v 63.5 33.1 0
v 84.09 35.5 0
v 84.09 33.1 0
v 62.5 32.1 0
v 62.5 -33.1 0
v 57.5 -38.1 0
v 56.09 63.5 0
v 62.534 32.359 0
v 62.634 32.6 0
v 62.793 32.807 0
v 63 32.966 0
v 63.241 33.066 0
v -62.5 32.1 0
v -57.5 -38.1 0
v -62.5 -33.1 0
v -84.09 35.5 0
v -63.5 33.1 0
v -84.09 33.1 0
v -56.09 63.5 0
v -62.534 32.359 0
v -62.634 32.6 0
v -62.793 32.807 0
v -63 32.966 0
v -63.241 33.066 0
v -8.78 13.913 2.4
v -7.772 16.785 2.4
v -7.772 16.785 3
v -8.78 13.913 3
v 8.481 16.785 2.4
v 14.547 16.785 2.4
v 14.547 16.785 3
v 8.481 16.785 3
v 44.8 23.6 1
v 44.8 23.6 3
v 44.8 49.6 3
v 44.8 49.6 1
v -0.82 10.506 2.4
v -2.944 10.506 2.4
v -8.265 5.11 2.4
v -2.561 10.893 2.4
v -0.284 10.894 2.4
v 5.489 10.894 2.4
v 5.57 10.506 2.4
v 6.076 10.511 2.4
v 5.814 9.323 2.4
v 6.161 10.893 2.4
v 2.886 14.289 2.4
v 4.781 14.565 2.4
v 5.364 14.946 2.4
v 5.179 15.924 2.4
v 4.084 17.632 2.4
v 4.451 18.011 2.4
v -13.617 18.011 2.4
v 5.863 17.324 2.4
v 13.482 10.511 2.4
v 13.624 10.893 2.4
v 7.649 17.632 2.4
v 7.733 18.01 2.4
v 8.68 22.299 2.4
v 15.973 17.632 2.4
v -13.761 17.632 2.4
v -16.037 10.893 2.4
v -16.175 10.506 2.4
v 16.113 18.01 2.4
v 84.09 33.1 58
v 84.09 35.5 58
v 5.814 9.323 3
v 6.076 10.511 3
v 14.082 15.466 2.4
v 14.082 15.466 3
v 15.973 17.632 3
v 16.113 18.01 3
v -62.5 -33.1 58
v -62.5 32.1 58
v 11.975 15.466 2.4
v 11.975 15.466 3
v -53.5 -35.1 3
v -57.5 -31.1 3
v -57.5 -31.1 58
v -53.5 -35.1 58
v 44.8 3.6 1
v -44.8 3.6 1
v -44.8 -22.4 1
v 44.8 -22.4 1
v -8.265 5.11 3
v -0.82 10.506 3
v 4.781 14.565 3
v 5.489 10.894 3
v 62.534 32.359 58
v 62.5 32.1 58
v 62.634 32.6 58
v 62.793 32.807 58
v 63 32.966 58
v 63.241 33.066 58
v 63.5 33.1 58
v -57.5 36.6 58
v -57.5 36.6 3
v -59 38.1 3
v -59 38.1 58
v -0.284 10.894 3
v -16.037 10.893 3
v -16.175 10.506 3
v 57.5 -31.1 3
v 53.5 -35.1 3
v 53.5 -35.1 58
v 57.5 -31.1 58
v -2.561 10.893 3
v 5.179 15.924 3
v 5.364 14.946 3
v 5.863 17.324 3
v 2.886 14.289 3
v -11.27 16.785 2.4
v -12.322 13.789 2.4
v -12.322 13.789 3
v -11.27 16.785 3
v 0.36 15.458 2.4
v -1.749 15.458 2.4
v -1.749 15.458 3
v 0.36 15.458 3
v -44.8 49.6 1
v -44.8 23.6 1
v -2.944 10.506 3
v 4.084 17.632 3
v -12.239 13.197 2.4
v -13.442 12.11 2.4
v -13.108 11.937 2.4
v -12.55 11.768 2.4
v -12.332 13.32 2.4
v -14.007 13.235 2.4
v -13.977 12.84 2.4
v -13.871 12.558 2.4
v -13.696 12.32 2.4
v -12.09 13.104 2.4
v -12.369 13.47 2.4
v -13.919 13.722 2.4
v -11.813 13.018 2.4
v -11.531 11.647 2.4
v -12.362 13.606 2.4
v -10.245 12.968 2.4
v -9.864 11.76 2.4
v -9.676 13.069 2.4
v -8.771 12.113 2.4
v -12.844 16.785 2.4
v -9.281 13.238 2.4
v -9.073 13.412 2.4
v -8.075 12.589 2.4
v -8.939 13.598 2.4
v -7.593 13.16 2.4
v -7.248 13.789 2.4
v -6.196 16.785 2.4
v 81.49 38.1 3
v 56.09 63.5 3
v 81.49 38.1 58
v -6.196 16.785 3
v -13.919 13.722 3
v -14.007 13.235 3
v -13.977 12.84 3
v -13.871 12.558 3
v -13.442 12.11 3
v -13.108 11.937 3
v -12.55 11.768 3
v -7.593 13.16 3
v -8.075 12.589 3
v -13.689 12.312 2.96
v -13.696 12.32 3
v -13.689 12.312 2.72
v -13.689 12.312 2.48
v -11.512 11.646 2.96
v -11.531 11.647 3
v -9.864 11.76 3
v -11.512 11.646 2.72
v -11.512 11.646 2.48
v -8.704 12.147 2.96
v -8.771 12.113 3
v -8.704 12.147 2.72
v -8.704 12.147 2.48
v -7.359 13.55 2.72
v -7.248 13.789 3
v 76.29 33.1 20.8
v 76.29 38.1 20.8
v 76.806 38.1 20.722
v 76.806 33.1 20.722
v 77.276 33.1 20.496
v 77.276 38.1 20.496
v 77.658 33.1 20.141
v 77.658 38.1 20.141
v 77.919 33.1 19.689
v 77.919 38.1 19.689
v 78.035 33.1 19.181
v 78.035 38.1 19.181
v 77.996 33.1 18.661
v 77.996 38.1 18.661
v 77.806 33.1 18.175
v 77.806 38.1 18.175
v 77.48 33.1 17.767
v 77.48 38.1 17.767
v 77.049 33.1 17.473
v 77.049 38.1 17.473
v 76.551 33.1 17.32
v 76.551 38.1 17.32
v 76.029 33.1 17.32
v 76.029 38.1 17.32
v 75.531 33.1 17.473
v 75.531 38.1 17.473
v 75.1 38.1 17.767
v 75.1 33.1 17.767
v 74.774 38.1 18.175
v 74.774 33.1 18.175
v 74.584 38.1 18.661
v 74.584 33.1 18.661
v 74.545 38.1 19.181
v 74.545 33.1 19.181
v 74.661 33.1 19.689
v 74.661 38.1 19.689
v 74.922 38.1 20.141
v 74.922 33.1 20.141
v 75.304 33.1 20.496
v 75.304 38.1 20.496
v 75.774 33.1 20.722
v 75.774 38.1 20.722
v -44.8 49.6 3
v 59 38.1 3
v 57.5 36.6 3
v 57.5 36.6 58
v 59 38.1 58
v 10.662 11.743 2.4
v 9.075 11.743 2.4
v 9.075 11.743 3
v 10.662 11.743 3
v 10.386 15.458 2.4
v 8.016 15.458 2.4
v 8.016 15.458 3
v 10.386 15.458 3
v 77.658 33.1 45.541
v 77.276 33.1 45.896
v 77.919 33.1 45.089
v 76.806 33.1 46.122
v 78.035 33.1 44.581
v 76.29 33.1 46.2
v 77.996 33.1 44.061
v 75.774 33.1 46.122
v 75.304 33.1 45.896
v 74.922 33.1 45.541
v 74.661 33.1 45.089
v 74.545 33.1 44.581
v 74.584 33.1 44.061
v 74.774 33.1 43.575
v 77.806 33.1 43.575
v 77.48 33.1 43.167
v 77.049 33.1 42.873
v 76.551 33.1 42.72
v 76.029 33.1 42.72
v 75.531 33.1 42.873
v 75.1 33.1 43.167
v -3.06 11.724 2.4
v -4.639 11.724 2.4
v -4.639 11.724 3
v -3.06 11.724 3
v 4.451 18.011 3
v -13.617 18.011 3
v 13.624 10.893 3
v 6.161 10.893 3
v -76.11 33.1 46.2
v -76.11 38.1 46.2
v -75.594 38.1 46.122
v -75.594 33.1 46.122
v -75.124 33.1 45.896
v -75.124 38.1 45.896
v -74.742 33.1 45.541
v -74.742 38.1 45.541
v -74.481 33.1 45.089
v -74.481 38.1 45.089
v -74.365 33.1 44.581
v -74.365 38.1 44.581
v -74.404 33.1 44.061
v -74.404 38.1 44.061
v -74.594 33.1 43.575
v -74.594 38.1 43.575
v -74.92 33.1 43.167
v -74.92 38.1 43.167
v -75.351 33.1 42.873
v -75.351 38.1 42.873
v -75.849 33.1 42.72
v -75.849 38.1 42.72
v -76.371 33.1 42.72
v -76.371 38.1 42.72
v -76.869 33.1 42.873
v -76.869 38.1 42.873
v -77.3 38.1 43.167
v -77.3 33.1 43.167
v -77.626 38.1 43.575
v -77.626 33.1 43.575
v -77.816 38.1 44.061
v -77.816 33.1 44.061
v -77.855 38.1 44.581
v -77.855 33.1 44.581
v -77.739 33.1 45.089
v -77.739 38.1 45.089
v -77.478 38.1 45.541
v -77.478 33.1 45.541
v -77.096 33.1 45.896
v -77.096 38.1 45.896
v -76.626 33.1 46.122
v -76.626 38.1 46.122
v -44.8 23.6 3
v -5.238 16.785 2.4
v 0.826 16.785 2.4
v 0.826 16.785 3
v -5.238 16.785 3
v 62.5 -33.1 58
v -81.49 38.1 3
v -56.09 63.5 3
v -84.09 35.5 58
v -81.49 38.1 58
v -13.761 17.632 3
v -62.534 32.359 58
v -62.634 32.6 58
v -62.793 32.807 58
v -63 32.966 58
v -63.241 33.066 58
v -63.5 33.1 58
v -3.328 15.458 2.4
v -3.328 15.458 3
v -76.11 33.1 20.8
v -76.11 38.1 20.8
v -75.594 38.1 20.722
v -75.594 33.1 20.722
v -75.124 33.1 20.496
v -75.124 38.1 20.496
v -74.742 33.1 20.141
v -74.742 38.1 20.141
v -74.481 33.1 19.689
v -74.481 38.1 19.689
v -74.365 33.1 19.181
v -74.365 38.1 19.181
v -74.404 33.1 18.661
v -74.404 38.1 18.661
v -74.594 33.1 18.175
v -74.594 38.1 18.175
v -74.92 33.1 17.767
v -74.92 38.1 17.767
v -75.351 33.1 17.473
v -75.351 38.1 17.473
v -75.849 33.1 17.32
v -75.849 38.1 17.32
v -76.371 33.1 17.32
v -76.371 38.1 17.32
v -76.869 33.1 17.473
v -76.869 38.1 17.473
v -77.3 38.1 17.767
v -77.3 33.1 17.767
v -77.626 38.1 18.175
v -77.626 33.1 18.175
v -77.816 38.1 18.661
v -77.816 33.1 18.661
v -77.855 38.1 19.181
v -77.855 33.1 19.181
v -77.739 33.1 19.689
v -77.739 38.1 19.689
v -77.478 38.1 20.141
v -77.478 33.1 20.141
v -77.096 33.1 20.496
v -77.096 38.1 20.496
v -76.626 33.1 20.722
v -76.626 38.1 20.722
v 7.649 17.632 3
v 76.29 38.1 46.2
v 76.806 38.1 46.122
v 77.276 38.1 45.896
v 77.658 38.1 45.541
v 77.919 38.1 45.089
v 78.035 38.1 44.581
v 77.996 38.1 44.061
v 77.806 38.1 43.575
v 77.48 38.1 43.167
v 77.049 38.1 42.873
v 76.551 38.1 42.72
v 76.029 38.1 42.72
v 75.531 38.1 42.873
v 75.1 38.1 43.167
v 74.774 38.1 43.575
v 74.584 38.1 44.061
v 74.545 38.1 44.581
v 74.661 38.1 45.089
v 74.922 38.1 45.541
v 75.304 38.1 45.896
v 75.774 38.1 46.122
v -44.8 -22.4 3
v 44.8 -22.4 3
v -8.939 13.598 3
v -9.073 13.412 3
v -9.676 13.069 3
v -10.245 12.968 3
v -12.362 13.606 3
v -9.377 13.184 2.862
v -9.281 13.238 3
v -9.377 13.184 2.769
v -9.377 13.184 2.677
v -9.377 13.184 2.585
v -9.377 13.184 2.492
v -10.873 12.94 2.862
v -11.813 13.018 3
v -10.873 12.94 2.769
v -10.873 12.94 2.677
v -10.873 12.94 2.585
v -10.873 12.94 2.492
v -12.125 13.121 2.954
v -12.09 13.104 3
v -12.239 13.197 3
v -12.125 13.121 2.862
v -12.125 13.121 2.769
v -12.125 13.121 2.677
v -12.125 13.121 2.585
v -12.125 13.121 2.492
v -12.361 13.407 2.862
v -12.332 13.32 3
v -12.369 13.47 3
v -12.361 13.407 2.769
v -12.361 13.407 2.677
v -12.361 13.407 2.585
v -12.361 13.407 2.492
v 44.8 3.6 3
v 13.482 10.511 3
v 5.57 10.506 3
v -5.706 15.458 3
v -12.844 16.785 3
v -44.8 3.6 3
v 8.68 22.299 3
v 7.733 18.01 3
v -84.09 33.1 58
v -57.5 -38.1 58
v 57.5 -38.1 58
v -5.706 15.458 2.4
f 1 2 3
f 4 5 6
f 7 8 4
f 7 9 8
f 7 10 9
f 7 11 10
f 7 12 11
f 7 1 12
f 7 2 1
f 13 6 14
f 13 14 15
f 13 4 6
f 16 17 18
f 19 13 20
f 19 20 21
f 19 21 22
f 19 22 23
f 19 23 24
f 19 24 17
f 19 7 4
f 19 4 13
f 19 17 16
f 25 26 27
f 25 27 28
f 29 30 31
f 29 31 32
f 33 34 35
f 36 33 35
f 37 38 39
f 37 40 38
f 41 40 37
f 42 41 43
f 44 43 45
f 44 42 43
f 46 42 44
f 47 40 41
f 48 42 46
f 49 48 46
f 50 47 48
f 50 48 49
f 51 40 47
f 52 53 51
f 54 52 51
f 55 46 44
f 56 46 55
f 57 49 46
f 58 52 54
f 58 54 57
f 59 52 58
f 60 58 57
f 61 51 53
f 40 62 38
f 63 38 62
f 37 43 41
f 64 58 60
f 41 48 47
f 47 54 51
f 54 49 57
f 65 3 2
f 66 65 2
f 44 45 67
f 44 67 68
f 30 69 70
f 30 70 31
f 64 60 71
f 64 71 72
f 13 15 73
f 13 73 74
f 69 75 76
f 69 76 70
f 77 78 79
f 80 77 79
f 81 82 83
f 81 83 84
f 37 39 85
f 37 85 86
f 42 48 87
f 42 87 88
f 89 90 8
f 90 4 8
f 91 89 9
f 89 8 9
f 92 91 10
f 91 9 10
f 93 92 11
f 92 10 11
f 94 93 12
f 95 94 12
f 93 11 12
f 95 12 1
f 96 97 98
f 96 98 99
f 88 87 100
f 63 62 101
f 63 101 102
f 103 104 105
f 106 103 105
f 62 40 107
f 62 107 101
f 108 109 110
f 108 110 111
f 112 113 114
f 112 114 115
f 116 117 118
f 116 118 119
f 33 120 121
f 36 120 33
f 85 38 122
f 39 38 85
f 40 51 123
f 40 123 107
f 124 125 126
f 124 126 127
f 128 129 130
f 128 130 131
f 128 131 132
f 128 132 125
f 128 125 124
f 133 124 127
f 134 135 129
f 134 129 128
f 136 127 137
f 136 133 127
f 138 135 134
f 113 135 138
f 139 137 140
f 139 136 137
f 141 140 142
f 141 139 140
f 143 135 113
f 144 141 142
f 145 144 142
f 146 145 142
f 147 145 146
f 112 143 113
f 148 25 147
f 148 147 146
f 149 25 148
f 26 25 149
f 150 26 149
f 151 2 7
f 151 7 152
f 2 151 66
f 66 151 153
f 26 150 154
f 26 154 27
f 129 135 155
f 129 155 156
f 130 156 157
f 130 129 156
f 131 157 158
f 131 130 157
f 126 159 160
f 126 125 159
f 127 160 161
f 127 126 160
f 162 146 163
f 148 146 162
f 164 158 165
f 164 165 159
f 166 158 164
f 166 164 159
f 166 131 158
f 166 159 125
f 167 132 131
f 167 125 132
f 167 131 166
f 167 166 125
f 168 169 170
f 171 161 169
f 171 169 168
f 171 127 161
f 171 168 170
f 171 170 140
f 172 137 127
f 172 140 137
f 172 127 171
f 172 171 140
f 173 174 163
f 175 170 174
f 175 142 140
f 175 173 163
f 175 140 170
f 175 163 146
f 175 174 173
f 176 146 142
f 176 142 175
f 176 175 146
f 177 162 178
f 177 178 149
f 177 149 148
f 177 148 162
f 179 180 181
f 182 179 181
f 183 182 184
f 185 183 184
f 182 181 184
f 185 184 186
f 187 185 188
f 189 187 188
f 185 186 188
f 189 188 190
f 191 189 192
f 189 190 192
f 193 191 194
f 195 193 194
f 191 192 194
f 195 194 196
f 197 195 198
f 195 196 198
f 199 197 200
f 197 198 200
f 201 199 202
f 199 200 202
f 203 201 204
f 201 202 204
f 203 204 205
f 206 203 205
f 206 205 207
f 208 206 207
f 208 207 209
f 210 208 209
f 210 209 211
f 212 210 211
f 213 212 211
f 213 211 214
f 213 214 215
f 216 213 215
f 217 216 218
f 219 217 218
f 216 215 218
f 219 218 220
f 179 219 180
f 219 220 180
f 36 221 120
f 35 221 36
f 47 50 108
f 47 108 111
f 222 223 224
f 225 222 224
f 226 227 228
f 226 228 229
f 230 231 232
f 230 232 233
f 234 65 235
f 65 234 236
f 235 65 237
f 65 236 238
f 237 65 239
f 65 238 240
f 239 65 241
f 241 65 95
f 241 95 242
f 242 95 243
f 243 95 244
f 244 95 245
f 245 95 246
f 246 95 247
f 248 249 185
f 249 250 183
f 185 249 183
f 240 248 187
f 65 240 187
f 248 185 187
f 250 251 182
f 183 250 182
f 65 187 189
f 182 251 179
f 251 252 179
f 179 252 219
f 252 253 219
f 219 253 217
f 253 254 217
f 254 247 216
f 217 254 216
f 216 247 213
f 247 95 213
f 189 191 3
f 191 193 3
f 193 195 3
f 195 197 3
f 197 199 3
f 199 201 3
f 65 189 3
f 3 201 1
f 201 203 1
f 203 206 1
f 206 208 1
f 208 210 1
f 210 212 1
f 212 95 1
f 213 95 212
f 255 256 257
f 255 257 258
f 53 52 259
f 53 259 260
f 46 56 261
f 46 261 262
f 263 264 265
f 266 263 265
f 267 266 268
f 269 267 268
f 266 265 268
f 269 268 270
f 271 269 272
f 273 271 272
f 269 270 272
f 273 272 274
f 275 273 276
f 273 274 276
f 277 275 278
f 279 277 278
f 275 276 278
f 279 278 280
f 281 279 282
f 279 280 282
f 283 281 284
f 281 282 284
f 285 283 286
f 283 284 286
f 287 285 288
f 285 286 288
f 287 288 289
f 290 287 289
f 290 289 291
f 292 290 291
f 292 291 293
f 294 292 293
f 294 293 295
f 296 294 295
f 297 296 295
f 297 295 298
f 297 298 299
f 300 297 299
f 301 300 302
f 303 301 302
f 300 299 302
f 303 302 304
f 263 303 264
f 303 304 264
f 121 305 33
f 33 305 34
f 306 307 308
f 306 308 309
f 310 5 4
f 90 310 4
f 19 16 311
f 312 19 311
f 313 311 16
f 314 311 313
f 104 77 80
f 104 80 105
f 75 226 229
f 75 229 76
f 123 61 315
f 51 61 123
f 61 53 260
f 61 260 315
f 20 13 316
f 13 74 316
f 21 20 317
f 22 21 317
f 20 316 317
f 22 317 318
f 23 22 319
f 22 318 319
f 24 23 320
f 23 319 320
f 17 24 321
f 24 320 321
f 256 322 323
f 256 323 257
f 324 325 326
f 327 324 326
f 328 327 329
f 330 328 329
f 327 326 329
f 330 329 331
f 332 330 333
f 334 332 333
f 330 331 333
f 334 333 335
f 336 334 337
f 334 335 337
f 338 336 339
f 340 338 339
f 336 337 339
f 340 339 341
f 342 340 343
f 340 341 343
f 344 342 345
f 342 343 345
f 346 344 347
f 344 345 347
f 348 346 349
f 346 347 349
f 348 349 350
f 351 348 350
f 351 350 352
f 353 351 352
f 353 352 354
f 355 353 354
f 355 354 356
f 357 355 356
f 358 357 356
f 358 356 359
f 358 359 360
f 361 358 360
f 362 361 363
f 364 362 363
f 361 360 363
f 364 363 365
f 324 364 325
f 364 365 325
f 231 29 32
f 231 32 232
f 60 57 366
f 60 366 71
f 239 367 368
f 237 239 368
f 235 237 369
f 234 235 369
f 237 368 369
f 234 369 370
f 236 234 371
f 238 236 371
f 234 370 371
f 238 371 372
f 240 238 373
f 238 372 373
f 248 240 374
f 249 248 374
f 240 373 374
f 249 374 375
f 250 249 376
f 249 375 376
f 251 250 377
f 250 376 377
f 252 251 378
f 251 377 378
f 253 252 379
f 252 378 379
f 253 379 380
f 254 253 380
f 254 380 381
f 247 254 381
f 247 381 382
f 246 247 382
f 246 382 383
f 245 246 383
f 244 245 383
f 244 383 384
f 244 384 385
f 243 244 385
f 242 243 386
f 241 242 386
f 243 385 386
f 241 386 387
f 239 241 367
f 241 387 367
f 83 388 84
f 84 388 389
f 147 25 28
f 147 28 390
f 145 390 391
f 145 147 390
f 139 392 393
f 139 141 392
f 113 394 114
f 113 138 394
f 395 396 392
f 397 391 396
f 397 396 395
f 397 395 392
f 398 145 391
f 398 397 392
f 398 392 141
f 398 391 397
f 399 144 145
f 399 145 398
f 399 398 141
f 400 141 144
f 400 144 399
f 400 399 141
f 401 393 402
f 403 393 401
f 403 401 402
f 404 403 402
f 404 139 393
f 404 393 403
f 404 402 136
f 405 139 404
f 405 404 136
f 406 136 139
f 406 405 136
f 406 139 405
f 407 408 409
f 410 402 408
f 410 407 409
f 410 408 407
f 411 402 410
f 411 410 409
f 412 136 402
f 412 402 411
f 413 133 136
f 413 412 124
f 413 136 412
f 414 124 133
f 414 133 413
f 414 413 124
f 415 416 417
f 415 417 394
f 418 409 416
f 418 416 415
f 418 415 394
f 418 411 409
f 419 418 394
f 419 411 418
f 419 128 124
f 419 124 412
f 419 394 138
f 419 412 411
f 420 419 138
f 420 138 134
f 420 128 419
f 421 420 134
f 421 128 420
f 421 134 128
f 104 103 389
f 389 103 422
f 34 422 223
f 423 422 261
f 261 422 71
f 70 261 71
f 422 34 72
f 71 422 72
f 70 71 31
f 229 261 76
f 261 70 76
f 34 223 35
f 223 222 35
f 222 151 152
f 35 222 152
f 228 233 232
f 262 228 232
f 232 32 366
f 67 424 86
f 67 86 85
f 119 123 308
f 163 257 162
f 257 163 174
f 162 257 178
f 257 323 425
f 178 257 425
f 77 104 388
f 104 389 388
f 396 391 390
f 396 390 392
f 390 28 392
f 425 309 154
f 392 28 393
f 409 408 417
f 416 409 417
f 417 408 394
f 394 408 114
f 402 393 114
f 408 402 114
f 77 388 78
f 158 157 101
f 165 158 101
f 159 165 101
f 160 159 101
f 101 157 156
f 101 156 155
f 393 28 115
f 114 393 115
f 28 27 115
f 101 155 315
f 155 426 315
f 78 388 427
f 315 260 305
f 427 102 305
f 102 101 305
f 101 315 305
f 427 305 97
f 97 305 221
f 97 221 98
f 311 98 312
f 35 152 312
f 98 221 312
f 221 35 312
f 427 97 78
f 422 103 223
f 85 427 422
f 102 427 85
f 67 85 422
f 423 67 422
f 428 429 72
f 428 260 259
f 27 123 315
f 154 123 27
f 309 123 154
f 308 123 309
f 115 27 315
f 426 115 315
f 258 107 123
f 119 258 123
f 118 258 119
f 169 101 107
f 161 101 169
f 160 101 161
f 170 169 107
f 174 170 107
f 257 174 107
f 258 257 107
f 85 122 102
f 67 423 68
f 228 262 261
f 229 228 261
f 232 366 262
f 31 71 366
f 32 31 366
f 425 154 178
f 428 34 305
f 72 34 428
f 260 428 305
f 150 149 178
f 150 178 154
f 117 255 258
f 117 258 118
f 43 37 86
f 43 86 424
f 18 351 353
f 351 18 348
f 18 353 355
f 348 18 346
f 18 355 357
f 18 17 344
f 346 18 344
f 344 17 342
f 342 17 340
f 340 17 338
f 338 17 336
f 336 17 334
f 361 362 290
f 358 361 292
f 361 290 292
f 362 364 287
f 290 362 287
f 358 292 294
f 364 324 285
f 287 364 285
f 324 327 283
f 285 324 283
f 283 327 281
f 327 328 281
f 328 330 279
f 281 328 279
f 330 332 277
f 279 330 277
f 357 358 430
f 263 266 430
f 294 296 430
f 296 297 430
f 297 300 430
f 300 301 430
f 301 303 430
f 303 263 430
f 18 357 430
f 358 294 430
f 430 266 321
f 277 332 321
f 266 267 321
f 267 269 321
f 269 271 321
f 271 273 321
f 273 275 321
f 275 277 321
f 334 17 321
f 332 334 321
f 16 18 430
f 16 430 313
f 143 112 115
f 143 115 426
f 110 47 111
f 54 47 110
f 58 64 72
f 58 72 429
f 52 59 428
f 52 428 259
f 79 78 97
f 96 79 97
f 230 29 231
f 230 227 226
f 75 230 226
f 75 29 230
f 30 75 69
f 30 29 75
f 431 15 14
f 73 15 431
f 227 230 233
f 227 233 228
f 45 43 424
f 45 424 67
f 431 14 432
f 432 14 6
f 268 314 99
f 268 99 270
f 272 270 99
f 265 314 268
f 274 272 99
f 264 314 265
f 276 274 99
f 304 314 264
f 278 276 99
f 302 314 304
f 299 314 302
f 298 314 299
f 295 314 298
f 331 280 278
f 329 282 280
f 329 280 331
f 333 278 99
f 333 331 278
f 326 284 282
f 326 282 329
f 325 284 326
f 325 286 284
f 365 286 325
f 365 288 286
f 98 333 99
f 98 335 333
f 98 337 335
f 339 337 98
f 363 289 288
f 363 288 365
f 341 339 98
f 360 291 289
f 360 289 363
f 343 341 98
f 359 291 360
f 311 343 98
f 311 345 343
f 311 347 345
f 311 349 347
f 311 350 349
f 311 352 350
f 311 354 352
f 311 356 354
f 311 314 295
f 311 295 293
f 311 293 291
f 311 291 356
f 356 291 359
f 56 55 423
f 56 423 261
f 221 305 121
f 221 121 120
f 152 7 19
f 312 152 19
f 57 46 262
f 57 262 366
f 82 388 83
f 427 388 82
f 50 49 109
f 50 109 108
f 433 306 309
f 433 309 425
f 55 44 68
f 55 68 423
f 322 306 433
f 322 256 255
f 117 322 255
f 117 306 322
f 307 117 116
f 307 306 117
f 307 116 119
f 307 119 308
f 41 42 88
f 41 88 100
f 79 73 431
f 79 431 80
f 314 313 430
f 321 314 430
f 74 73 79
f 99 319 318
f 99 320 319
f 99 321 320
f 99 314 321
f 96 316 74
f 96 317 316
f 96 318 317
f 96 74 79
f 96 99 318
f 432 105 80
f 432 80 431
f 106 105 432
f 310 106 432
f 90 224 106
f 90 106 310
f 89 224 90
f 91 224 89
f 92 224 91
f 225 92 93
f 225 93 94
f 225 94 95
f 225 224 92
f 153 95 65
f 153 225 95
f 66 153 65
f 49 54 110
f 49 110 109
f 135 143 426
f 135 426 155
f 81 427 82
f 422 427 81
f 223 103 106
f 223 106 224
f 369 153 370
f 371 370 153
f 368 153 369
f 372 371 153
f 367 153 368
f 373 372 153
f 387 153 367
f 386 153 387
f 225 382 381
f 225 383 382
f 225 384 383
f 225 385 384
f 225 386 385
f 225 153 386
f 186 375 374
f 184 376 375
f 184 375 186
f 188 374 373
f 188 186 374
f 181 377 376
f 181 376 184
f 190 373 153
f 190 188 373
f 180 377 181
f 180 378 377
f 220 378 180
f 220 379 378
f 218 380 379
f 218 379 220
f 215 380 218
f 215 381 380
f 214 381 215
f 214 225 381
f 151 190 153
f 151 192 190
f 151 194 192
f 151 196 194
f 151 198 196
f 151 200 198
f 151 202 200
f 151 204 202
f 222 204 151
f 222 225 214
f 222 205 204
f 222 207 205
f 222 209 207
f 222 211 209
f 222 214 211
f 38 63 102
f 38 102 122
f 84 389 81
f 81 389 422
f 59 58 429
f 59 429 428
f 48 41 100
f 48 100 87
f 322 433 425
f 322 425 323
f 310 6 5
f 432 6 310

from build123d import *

# Parameters (mm, degrees)
SKETCH1_W           = 125
SKETCH1_H           = 76.2
BOSS_EXTRUDE1_DEPTH = 3
SKETCH2_W           = 5
SKETCH2_H           = 76.2
BOSS_EXTRUDE2_DEPTH = 55
SKETCH4_W           = 58
SKETCH4_H           = 5
BOSS_EXTRUDE4_DEPTH = 21.59
SKETCH5_W           = 58
SKETCH5_H           = 5
BOSS_EXTRUDE5_DEPTH = 21.59
SKETCH6_W           = 168.18
SKETCH6_H           = 25.4
BOSS_EXTRUDE6_DEPTH = 3
CHAMFER1_SIZE       = 28
SKETCH7_W           = 89.6
SKETCH7_H           = 26
CUT_EXTRUDE1_DEPTH  = 2
SKETCH9_W           = 115
SKETCH9_H           = 3
BOSS_EXTRUDE7_DEPTH = 55
CHAMFER2_SIZE       = 4
CHAMFER3_SIZE       = 5
CUT_EXTRUDE2_START  = -0.6
CUT_EXTRUDE2_DEPTH  = 0.6
SKETCH11_R          = 1.75
CUT_EXTRUDE3_DEPTH  = 5
SKETCH12_R          = 1.75
CUT_EXTRUDE4_DEPTH  = 5
FILLET1_R           = 1
CHAMFER4_SIZE       = 1.5


# Read off the part's stored shape, not the designer's step: Cut-Extrude2
with BuildPart() as part:
    # Sketch1 → Boss-Extrude1 (new body)
    with BuildSketch(Plane.XY):
        Rectangle(SKETCH1_W, SKETCH1_H)
    extrude(amount=BOSS_EXTRUDE1_DEPTH)

    # Sketch2 → Boss-Extrude2 (add)
    with BuildSketch(Plane.XY.offset(3)):
        with Locations((-60, 0)):
            Rectangle(SKETCH2_W, SKETCH2_H)
        with Locations((60, 0)):
            Rectangle(SKETCH2_W, SKETCH2_H)
    extrude(amount=BOSS_EXTRUDE2_DEPTH)

    # Sketch4 → Boss-Extrude4 (add)
    with BuildSketch(Plane.ZY.offset(62.5)):
        with Locations((29, 35.6)):
            Rectangle(SKETCH4_W, SKETCH4_H)
    extrude(amount=BOSS_EXTRUDE4_DEPTH)

    # Sketch5 → Boss-Extrude5 (add)
    with BuildSketch(Plane(origin=(62.5, 0, 0), x_dir=(0, 0, -1), z_dir=(1, 0, 0))):
        with Locations((-29, 35.6)):
            Rectangle(SKETCH5_W, SKETCH5_H)
    extrude(amount=BOSS_EXTRUDE5_DEPTH)

    # Sketch6 → Boss-Extrude6 (add)
    with BuildSketch(Plane(origin=(0, 0, 0), x_dir=(-1, 0, 0), z_dir=(0, 0, -1))):
        with Locations((0, 50.8)):
            Rectangle(SKETCH6_W, SKETCH6_H)
    extrude(amount=-BOSS_EXTRUDE6_DEPTH)

    # Chamfer1
    chamfer1_edges = [part.edges().sort_by_distance(p)[0] for p in [
        (-84.09, 63.5, 1.5),
        (84.09, 63.5, 1.5),
    ]]
    chamfer(chamfer1_edges, length=CHAMFER1_SIZE)

    # Sketch7 → Cut-Extrude1 (cut)
    with BuildSketch(Plane.XY.offset(3)):
        with Locations((0, -9.4)):
            Rectangle(SKETCH7_W, SKETCH7_H)
        with Locations((0, 36.6)):
            Rectangle(SKETCH7_W, SKETCH7_H)
    extrude(amount=-CUT_EXTRUDE1_DEPTH, mode=Mode.SUBTRACT)

    # Sketch9 → Boss-Extrude7 (add)
    with BuildSketch(Plane.XY.offset(3)):
        with Locations((0, -36.6)):
            Rectangle(SKETCH9_W, SKETCH9_H)
    extrude(amount=BOSS_EXTRUDE7_DEPTH)

    # Chamfer2
    chamfer2_edges = [part.edges().sort_by_distance(p)[0] for p in [
        (-57.5, -35.1, 30.5),
        (57.5, -35.1, 30.5),
    ]]
    chamfer(chamfer2_edges, length=CHAMFER2_SIZE)

    # Chamfer3
    chamfer3_edges = [part.edges().sort_by_distance(p)[0] for p in [
        (62.5, -38.1, 29),
        (-62.5, -38.1, 29),
    ]]
    chamfer(chamfer3_edges, length=CHAMFER3_SIZE)

    # Cut-Extrude2 outline → Cut-Extrude2 (cut)
    # profile 1 of 4: a face of its own
    with BuildSketch(Plane.XY.offset(3).offset(CUT_EXTRUDE2_START)):
        with BuildLine():
            Line((-12.843793417, 16.784775128), (-13.918894641, 13.722312614))
            add(Edge.make_bspline(
                [(-13.918894641, 13.722312614), (-13.950745906, 13.608646354), (-13.97919001, 13.483685694), (-14.011317489, 13.235305925), (-14.01541758, 13.110841548), (-13.989547543, 12.867284383), (-13.959604678, 12.747961158), (-13.857332343, 12.519974586), (-13.78490702, 12.411398187), (-13.592313629, 12.212018271), (-13.472083062, 12.121314997), (-13.184369222, 11.962818623), (-13.016909084, 11.895027419), (-12.454211206, 11.728033285), (-11.997806272, 11.664794493), (-11.025815686, 11.62704002), (-10.511530183, 11.651603075), (-9.78258436, 11.770518687), (-9.546683753, 11.824200176), (-9.102156978, 11.962599668), (-8.89364967, 12.047436893), (-8.514064046, 12.246658938), (-8.343153207, 12.361026326), (-8.04132547, 12.611058926), (-7.910418089, 12.746448479), (-7.679883041, 13.0275306), (-7.579636344, 13.172799488), (-7.44297026, 13.39668043), (-7.39971151, 13.472431032), (-7.318663078, 13.627460279), (-7.280772846, 13.706786212), (-7.248185858, 13.788667895)],
                knots=[0, 0, 0, 0, 0.0625, 0.0625, 0.125, 0.125, 0.1875, 0.1875, 0.25, 0.25, 0.3125, 0.3125, 0.375, 0.375, 0.5, 0.5, 0.625, 0.625, 0.6875, 0.6875, 0.75, 0.75, 0.8125, 0.8125, 0.875, 0.875, 0.9375, 0.9375, 0.96875, 0.96875, 1, 1, 1, 1], degree=3))
            Line((-7.248185858, 13.788667895), (-6.196379448, 16.784775128))
            Line((-6.196379448, 16.784775128), (-7.771512854, 16.784775171))
            Line((-7.771512854, 16.784775171), (-8.779640442, 13.913087848))
            add(Edge.make_bspline(
                [(-8.779640442, 13.913087848), (-8.801212863, 13.867686768), (-8.828630281, 13.811426743), (-8.890437912, 13.684919137), (-8.925723343, 13.615289873), (-9.014867696, 13.477778317), (-9.069034752, 13.410065742), (-9.20356673, 13.286811644), (-9.283951715, 13.231246188), (-9.470687062, 13.136081945), (-9.576947425, 13.096402347), (-9.809000897, 13.032201026), (-9.934689567, 13.00760449), (-10.326953956, 12.952228061), (-10.607716868, 12.939250309), (-11.138236784, 12.940792557), (-11.387946526, 12.95495502), (-11.815776289, 13.010911905), (-11.994686961, 13.05312605), (-12.19022456, 13.154353945), (-12.243244201, 13.194586759), (-12.322270156, 13.289978248), (-12.348136332, 13.345299657), (-12.373130151, 13.46826163), (-12.371956966, 13.5361378), (-12.35254935, 13.67085438), (-12.333771283, 13.737944141), (-12.322165603, 13.788667937)],
                knots=[0, 0, 0, 0, 0.0625, 0.0625, 0.125, 0.125, 0.1875, 0.1875, 0.25, 0.25, 0.3125, 0.3125, 0.375, 0.375, 0.5, 0.5, 0.625, 0.625, 0.75, 0.75, 0.8125, 0.8125, 0.875, 0.875, 0.9375, 0.9375, 1, 1, 1, 1], degree=3))
            Line((-12.322165603, 13.788667937), (-11.2703582, 16.784775128))
            Line((-11.2703582, 16.784775128), (-12.843793417, 16.784775128))
        make_face()
    # profile 2 of 4: a face of its own
    with BuildSketch(Plane.XY.offset(3).offset(CUT_EXTRUDE2_START)):
        Polygon((14.082145905, 15.466432145), (14.547318434, 16.784775128), (8.481425261, 16.784775128), (8.015662645, 15.45803385), (10.386127447, 15.45803385), (9.075451111, 11.743439605), (10.661733364, 11.743439605), (11.975372051, 15.466432145), align=None)
    # profile 3 of 4: a face of its own
    with BuildSketch(Plane.XY.offset(3).offset(CUT_EXTRUDE2_START)):
        Polygon((0.359928822, 15.45803385), (0.825593089, 16.784775128), (-5.237786258, 16.784775128), (-5.705919648, 15.45803385), (-3.328357423, 15.45803385), (-4.639000977, 11.723834147), (-3.059652234, 11.723834147), (-1.74900868, 15.45803385), align=None)
    # profile 4 of 4: a face of its own
    with BuildSketch(Plane.XY.offset(3).offset(CUT_EXTRUDE2_START)):
        Polygon((7.732615088, 18.009820452), (8.67993853, 22.298690548), (4.451236342, 18.010625114), (-13.617285872, 18.010625114), (-13.760696138, 17.631800344), (4.083976363, 17.631800344), (-2.561139847, 10.89339914), (-16.036862666, 10.89339914), (-16.175076152, 10.505618026), (-2.943552817, 10.505618026), (-8.264964605, 5.10950355), (-0.819885517, 10.505618026), (5.569839691, 10.505618026), (5.813932632, 9.32327198), (6.07620201, 10.510665049), (13.482070183, 10.510665049), (13.624063348, 10.89339914), (6.160742258, 10.89339914), (7.649117922, 17.631800344), (15.972876762, 17.631800344), (16.113123511, 18.009820452), align=None)
        Polygon((-0.283933962, 10.894070437), (4.780674194, 14.564845582), (5.489286994, 10.894070437), align=None, mode=Mode.SUBTRACT)
        Polygon((5.863139247, 17.323666682), (5.364033793, 14.945937564), (5.179256414, 15.9244998), (2.885975157, 14.289472868), align=None, mode=Mode.SUBTRACT)
    extrude(amount=CUT_EXTRUDE2_DEPTH, mode=Mode.SUBTRACT)

    # Sketch11 → Cut-Extrude3 (cut)
    with BuildSketch(Plane(origin=(0, 38.1, 0), x_dir=(1, 0, 0), z_dir=(0, 1, 0))):
        with Locations(Location((-76.11, -19.05, 0), (0, 0, 270))):
            Circle(SKETCH11_R)
        with Locations(Location((76.29, -19.05, 0), (0, 0, 270))):
            Circle(SKETCH11_R)
    extrude(amount=-CUT_EXTRUDE3_DEPTH, mode=Mode.SUBTRACT)

    # Sketch12 → Cut-Extrude4 (cut)
    with BuildSketch(Plane(origin=(0, 38.1, 0), x_dir=(1, 0, 0), z_dir=(0, 1, 0))):
        with Locations(Location((-76.11, -44.45, 0), (0, 0, 270))):
            Circle(SKETCH12_R)
        with Locations(Location((76.29, -44.45, 0), (0, 0, 270))):
            Circle(SKETCH12_R)
    extrude(amount=-CUT_EXTRUDE4_DEPTH, mode=Mode.SUBTRACT)

    # Fillet1
    fillet1_edges = [part.edges().sort_by_distance(p)[0] for p in [
        (-62.5, 33.1, 29),
        (62.5, 33.1, 29),
    ]]
    fillet(fillet1_edges, radius=FILLET1_R)

    # Chamfer4
    chamfer4_edges = [part.edges().sort_by_distance(p)[0] for p in [
        (-57.5, 38.1, 30.5),
        (57.5, 38.1, 30.5),
    ]]
    chamfer(chamfer4_edges, length=CHAMFER4_SIZE)


solid = part.part
